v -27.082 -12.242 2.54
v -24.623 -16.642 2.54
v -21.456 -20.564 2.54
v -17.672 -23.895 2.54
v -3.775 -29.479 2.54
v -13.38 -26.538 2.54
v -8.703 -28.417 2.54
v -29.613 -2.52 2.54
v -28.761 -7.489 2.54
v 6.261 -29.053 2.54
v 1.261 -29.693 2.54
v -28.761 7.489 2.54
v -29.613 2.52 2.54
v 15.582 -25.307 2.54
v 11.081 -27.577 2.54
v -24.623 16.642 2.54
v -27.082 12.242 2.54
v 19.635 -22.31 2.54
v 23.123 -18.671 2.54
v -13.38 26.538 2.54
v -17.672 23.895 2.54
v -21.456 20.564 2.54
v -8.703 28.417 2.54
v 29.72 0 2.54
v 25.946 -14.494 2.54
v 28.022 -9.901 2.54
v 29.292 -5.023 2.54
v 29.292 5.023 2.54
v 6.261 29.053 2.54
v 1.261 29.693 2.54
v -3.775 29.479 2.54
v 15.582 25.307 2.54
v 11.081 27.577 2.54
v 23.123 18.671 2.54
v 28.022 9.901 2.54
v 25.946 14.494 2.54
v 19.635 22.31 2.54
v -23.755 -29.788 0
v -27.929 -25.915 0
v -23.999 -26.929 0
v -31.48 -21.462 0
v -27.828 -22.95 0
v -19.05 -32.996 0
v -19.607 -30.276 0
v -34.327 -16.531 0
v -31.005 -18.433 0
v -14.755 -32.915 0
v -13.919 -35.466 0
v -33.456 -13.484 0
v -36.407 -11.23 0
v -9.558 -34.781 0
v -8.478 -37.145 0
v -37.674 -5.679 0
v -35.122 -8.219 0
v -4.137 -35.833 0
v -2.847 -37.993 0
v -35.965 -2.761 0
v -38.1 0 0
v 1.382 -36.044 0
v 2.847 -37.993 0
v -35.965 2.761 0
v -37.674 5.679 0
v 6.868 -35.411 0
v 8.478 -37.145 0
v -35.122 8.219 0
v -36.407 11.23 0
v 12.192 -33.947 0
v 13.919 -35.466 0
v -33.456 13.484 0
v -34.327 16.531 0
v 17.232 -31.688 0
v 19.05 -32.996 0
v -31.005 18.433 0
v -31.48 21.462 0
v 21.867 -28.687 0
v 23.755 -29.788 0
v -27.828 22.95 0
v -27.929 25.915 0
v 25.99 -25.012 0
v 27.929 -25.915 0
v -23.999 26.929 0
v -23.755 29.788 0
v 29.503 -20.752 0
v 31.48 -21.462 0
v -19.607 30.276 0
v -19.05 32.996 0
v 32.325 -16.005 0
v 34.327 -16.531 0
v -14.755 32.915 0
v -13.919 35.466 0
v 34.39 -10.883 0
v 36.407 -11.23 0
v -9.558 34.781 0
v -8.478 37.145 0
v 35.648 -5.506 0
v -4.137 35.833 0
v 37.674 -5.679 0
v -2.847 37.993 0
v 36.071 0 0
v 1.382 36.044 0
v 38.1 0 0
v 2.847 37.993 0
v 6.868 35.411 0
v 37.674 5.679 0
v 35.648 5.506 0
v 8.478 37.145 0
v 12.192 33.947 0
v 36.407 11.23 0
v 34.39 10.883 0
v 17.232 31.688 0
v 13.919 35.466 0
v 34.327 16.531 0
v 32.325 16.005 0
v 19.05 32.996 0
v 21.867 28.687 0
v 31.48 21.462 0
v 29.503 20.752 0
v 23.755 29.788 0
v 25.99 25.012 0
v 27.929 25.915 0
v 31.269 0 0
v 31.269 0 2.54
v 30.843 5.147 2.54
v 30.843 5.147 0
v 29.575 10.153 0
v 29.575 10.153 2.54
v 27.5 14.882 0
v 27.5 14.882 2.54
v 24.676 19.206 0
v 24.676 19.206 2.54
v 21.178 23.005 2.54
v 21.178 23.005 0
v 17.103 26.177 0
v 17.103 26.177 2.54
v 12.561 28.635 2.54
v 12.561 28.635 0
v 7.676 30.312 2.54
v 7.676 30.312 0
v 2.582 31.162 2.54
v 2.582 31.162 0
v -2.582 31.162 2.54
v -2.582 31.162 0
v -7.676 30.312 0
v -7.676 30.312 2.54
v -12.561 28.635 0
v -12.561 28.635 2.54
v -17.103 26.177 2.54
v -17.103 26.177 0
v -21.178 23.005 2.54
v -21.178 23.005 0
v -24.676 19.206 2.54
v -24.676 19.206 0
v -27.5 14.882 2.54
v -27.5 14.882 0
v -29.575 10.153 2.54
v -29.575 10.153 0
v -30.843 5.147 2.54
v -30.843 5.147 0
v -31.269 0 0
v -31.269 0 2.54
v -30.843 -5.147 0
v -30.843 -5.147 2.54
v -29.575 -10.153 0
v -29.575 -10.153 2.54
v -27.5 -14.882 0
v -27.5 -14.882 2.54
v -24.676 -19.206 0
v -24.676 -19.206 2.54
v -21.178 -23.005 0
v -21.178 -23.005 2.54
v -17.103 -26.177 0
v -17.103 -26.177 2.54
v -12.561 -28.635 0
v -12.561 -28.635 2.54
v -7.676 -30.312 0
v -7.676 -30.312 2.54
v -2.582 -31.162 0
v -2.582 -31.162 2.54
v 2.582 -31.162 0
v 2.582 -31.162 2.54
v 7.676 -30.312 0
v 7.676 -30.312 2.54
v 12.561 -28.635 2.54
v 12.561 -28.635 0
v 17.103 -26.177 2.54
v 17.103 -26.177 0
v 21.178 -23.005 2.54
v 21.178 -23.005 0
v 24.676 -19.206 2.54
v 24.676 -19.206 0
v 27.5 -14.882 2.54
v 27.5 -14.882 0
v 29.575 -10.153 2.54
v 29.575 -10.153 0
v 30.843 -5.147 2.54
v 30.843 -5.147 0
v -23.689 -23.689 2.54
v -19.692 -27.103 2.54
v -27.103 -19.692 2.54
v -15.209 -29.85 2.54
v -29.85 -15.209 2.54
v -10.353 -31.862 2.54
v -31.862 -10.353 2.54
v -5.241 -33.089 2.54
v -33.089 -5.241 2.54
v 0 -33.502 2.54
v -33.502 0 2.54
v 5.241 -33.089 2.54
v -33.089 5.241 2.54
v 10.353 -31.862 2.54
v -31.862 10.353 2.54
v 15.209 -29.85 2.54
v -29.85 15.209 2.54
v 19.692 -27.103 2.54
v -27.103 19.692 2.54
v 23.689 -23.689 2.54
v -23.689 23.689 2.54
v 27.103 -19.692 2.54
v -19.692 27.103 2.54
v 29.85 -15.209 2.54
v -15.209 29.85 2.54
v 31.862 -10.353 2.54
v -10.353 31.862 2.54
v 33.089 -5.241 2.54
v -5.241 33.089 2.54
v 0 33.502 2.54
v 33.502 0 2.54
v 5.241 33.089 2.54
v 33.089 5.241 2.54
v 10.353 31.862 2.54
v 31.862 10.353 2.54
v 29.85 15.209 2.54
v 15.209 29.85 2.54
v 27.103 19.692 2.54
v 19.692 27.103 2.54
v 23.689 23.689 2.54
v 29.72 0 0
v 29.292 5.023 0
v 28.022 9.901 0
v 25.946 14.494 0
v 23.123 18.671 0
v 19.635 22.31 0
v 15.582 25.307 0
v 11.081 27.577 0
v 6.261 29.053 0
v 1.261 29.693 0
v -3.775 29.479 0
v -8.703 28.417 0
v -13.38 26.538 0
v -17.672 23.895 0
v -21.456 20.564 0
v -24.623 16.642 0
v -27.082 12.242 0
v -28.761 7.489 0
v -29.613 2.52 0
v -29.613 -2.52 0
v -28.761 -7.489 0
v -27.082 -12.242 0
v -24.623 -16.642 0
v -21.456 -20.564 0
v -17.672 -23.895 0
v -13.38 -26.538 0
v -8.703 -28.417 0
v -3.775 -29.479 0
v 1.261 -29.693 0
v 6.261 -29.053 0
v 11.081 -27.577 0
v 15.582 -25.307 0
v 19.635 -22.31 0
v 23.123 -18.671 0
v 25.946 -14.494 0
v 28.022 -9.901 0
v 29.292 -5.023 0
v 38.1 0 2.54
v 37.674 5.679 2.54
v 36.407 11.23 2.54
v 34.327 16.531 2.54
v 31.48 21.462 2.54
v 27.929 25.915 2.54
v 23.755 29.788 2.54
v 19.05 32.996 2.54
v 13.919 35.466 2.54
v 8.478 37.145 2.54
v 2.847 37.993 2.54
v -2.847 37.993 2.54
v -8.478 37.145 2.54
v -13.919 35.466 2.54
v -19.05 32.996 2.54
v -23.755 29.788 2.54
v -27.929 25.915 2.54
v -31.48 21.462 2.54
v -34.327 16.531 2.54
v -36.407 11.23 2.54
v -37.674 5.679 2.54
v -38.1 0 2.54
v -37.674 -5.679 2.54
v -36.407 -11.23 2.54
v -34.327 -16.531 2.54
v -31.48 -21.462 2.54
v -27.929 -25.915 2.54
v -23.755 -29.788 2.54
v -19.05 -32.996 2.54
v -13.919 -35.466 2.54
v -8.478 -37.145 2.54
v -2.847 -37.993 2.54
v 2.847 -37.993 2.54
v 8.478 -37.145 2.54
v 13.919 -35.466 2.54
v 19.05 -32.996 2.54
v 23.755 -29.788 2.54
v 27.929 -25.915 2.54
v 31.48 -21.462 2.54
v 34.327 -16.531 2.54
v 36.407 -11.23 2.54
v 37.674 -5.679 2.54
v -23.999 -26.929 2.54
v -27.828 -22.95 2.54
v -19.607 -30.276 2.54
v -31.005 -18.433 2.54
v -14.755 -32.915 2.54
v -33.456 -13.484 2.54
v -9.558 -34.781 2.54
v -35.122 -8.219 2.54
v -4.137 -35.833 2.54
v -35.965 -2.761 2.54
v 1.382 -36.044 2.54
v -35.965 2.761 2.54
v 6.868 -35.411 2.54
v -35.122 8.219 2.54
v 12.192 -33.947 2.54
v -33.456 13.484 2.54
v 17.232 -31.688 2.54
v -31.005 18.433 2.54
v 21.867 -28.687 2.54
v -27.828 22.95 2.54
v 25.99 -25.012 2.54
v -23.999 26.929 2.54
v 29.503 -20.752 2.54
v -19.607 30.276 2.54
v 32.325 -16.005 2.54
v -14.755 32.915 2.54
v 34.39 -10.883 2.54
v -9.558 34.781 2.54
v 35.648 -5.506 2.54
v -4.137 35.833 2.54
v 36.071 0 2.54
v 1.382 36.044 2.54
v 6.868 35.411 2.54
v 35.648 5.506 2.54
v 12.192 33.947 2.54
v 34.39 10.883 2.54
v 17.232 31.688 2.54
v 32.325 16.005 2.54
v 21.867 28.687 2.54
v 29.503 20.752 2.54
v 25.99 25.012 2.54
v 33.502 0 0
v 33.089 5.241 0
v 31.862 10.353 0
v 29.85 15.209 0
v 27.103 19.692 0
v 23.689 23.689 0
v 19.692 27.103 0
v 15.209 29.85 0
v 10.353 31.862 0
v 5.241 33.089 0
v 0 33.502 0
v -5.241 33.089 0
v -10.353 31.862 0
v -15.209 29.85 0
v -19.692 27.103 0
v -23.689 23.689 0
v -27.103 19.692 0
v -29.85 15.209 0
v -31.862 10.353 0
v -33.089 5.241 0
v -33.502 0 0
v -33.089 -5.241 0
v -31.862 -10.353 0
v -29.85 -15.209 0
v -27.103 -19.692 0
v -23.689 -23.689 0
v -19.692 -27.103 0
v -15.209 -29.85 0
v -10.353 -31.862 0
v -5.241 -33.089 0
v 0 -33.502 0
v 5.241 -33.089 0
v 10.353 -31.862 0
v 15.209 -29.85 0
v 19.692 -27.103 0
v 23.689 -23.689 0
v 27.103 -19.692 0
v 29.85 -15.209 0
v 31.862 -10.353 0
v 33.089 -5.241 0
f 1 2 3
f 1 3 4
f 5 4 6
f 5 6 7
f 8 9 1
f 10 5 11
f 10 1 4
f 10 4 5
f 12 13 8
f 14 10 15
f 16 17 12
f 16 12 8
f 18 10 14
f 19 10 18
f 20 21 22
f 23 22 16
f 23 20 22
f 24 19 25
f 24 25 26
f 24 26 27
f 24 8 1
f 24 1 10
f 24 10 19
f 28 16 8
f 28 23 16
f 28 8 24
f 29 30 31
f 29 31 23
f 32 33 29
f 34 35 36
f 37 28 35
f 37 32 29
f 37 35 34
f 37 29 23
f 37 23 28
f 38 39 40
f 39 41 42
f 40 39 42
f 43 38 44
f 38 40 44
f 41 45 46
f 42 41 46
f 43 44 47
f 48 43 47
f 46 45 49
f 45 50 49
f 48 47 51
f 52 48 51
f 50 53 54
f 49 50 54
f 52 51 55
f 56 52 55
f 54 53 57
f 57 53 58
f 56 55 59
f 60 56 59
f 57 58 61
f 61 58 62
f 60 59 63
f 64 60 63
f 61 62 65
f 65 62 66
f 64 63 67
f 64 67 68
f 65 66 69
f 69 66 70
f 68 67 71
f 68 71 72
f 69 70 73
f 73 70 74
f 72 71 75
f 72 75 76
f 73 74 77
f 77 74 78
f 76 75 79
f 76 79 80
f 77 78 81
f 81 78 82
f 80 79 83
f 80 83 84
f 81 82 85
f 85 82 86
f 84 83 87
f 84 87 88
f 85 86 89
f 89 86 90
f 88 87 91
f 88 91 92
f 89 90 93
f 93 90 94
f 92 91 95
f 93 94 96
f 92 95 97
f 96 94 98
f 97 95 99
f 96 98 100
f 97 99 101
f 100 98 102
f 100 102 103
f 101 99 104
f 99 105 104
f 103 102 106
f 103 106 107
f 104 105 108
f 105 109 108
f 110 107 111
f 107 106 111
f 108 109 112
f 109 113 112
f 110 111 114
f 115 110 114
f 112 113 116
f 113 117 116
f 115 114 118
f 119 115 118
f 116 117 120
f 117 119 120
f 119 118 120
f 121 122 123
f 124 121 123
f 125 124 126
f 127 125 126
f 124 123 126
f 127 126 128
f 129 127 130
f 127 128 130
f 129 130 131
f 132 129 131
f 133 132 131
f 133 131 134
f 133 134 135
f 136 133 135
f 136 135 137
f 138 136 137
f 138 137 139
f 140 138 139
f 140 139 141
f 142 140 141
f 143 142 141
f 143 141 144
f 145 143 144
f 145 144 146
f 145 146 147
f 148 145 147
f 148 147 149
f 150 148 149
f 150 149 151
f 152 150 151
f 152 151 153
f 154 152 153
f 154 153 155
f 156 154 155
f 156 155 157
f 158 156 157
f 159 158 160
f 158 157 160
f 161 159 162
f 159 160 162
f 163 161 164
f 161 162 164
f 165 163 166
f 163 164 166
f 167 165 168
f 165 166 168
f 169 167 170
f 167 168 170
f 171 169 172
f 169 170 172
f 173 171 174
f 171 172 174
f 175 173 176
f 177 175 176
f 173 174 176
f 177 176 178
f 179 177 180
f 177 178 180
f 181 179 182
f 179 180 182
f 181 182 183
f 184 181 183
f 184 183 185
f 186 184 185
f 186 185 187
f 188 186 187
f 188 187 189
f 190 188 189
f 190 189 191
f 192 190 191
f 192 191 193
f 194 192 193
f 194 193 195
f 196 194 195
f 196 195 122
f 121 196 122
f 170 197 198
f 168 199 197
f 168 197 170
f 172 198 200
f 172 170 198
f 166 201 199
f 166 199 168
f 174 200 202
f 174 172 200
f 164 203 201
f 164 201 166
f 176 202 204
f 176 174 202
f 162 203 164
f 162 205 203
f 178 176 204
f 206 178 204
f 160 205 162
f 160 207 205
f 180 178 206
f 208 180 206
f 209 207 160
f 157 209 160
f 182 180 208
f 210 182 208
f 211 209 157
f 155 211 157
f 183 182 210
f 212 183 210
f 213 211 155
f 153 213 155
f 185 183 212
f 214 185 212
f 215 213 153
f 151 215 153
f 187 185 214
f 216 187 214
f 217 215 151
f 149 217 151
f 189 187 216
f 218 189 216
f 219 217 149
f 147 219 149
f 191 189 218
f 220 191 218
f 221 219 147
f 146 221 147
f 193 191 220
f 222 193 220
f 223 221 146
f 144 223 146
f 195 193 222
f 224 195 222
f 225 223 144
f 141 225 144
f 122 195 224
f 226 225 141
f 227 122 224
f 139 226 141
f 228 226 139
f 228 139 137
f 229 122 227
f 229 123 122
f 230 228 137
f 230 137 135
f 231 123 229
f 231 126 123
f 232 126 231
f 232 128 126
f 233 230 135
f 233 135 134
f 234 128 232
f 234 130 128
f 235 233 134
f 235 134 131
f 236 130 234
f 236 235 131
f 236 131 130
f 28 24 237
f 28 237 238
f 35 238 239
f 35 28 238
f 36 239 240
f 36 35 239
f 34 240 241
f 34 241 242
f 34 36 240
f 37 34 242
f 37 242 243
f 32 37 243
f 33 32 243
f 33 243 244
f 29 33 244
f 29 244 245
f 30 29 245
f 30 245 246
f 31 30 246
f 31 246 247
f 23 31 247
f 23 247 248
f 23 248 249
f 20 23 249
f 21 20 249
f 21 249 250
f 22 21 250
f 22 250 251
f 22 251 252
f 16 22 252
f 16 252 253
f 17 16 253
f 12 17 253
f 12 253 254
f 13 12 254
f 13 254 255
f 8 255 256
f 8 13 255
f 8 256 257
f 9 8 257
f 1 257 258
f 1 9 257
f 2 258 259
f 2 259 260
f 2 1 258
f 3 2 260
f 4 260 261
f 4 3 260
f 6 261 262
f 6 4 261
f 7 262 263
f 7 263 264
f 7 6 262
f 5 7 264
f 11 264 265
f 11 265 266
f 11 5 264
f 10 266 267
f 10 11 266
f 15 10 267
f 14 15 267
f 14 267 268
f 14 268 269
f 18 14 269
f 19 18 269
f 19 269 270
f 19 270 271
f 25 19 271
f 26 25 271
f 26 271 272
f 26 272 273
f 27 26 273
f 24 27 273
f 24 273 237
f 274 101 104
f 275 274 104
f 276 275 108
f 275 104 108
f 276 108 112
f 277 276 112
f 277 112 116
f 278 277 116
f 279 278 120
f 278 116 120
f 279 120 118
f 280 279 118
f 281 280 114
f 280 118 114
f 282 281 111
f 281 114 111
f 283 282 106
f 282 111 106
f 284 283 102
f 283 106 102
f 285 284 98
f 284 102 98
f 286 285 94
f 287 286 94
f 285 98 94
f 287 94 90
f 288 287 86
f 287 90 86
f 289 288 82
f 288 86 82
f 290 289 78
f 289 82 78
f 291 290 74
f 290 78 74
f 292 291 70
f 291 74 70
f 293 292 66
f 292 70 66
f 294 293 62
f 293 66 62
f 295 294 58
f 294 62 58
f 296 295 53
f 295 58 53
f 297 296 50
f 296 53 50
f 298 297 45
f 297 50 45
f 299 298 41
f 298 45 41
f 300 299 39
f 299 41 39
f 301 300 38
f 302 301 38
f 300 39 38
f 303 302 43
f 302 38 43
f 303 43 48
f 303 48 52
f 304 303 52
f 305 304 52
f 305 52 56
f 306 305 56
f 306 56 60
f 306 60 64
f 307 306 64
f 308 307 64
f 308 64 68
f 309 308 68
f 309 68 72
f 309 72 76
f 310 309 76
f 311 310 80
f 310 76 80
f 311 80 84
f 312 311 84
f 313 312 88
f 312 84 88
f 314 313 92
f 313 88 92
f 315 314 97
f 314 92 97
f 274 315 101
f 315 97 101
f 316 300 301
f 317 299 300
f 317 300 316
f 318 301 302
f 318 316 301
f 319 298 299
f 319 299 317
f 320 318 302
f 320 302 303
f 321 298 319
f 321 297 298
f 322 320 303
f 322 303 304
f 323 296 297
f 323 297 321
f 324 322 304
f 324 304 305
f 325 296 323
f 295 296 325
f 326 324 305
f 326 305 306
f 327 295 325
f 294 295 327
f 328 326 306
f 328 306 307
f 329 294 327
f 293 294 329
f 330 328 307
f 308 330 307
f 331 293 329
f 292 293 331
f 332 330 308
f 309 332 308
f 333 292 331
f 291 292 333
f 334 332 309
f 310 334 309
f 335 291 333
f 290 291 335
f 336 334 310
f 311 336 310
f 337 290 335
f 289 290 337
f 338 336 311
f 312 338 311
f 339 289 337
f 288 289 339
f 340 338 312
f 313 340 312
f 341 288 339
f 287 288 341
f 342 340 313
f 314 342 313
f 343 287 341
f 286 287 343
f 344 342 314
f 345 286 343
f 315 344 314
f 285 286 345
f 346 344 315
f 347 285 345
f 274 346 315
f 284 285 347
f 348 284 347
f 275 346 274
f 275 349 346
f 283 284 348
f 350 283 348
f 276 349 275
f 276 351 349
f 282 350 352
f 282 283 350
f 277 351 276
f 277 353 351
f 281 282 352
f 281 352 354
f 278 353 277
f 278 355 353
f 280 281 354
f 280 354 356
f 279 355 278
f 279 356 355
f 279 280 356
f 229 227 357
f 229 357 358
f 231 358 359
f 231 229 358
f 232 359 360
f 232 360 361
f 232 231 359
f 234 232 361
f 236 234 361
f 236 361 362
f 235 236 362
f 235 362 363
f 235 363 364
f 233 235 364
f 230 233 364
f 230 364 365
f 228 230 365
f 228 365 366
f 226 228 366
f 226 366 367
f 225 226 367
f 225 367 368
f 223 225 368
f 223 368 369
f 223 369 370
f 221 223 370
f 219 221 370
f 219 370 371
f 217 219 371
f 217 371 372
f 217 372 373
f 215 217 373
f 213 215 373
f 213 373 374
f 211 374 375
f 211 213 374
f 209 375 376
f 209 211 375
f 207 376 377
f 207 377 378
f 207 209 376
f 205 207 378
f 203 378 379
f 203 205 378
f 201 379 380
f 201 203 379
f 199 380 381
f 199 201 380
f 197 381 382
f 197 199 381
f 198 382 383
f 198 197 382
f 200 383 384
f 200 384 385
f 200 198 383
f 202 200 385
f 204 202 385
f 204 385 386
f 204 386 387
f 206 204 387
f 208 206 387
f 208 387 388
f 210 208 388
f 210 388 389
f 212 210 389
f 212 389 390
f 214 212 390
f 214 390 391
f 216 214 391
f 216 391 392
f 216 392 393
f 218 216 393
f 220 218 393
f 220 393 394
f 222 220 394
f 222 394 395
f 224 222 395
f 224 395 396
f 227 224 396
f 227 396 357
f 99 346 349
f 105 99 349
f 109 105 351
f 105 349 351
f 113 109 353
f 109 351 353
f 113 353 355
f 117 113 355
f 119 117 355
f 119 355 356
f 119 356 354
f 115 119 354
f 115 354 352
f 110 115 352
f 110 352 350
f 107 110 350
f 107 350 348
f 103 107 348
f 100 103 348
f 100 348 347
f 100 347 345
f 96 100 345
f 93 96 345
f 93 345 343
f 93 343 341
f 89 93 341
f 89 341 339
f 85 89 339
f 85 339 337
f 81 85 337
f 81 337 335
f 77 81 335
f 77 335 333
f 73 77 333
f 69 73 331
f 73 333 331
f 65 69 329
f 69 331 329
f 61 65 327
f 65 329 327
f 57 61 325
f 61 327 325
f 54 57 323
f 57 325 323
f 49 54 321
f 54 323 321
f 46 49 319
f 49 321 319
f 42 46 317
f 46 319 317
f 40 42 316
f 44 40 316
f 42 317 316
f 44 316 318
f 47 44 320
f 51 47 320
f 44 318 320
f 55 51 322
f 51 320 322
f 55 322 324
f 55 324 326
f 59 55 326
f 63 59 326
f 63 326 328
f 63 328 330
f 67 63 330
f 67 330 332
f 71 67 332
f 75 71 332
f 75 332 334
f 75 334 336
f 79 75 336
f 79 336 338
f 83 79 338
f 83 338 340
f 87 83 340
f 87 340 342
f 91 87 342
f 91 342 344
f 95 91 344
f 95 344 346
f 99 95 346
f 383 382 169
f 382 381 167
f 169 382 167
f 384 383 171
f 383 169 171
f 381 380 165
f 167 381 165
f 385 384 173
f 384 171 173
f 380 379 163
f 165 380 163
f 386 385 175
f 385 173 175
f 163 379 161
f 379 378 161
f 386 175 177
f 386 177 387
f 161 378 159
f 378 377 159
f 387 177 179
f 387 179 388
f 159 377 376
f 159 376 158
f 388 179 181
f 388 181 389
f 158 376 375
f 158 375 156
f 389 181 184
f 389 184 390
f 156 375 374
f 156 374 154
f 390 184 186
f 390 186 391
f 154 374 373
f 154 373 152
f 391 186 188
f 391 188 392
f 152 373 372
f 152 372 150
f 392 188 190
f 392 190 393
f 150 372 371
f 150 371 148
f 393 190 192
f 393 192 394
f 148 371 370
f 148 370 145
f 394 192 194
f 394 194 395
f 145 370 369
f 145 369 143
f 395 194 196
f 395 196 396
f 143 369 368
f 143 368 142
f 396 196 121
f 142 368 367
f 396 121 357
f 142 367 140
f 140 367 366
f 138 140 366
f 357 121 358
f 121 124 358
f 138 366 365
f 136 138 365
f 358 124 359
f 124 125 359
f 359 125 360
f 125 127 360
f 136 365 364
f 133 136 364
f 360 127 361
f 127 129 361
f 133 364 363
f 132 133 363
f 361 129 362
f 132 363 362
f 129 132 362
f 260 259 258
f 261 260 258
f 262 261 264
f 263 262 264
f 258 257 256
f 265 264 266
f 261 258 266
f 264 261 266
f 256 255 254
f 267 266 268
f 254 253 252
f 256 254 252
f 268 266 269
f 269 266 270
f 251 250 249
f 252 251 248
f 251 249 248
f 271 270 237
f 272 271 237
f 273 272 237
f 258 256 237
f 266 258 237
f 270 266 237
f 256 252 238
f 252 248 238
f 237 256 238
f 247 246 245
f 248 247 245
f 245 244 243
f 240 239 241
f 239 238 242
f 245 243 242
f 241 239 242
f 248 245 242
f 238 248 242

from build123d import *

# Parameters (mm, degrees)
F0_R     = 38.1
F1_DEPTH = 2.54
F2_R     = 36.070547
F2_R_2   = 33.501718
F3_DEPTH = 25.4
F4_R     = 31.269157
F4_R_2   = 29.719914
F5_DEPTH = 25.4


with BuildPart() as f1:
    # F0 (on Top) → F1 (new body)
    with BuildSketch(Plane.XY):
        Circle(F0_R)
    extrude(amount=F1_DEPTH)

    # F2 (on face) → F3 (cut)
    with BuildSketch(Plane.XY.offset(2.54)):
        Circle(F2_R)
        Circle(F2_R_2, mode=Mode.SUBTRACT)
    extrude(amount=-F3_DEPTH, mode=Mode.SUBTRACT)

    # F4 (on face) → F5 (cut)
    with BuildSketch(Plane.XY.offset(2.54)):
        Circle(F4_R)
        Circle(F4_R_2, mode=Mode.SUBTRACT)
    extrude(amount=-F5_DEPTH, mode=Mode.SUBTRACT)


solid = f1.part
